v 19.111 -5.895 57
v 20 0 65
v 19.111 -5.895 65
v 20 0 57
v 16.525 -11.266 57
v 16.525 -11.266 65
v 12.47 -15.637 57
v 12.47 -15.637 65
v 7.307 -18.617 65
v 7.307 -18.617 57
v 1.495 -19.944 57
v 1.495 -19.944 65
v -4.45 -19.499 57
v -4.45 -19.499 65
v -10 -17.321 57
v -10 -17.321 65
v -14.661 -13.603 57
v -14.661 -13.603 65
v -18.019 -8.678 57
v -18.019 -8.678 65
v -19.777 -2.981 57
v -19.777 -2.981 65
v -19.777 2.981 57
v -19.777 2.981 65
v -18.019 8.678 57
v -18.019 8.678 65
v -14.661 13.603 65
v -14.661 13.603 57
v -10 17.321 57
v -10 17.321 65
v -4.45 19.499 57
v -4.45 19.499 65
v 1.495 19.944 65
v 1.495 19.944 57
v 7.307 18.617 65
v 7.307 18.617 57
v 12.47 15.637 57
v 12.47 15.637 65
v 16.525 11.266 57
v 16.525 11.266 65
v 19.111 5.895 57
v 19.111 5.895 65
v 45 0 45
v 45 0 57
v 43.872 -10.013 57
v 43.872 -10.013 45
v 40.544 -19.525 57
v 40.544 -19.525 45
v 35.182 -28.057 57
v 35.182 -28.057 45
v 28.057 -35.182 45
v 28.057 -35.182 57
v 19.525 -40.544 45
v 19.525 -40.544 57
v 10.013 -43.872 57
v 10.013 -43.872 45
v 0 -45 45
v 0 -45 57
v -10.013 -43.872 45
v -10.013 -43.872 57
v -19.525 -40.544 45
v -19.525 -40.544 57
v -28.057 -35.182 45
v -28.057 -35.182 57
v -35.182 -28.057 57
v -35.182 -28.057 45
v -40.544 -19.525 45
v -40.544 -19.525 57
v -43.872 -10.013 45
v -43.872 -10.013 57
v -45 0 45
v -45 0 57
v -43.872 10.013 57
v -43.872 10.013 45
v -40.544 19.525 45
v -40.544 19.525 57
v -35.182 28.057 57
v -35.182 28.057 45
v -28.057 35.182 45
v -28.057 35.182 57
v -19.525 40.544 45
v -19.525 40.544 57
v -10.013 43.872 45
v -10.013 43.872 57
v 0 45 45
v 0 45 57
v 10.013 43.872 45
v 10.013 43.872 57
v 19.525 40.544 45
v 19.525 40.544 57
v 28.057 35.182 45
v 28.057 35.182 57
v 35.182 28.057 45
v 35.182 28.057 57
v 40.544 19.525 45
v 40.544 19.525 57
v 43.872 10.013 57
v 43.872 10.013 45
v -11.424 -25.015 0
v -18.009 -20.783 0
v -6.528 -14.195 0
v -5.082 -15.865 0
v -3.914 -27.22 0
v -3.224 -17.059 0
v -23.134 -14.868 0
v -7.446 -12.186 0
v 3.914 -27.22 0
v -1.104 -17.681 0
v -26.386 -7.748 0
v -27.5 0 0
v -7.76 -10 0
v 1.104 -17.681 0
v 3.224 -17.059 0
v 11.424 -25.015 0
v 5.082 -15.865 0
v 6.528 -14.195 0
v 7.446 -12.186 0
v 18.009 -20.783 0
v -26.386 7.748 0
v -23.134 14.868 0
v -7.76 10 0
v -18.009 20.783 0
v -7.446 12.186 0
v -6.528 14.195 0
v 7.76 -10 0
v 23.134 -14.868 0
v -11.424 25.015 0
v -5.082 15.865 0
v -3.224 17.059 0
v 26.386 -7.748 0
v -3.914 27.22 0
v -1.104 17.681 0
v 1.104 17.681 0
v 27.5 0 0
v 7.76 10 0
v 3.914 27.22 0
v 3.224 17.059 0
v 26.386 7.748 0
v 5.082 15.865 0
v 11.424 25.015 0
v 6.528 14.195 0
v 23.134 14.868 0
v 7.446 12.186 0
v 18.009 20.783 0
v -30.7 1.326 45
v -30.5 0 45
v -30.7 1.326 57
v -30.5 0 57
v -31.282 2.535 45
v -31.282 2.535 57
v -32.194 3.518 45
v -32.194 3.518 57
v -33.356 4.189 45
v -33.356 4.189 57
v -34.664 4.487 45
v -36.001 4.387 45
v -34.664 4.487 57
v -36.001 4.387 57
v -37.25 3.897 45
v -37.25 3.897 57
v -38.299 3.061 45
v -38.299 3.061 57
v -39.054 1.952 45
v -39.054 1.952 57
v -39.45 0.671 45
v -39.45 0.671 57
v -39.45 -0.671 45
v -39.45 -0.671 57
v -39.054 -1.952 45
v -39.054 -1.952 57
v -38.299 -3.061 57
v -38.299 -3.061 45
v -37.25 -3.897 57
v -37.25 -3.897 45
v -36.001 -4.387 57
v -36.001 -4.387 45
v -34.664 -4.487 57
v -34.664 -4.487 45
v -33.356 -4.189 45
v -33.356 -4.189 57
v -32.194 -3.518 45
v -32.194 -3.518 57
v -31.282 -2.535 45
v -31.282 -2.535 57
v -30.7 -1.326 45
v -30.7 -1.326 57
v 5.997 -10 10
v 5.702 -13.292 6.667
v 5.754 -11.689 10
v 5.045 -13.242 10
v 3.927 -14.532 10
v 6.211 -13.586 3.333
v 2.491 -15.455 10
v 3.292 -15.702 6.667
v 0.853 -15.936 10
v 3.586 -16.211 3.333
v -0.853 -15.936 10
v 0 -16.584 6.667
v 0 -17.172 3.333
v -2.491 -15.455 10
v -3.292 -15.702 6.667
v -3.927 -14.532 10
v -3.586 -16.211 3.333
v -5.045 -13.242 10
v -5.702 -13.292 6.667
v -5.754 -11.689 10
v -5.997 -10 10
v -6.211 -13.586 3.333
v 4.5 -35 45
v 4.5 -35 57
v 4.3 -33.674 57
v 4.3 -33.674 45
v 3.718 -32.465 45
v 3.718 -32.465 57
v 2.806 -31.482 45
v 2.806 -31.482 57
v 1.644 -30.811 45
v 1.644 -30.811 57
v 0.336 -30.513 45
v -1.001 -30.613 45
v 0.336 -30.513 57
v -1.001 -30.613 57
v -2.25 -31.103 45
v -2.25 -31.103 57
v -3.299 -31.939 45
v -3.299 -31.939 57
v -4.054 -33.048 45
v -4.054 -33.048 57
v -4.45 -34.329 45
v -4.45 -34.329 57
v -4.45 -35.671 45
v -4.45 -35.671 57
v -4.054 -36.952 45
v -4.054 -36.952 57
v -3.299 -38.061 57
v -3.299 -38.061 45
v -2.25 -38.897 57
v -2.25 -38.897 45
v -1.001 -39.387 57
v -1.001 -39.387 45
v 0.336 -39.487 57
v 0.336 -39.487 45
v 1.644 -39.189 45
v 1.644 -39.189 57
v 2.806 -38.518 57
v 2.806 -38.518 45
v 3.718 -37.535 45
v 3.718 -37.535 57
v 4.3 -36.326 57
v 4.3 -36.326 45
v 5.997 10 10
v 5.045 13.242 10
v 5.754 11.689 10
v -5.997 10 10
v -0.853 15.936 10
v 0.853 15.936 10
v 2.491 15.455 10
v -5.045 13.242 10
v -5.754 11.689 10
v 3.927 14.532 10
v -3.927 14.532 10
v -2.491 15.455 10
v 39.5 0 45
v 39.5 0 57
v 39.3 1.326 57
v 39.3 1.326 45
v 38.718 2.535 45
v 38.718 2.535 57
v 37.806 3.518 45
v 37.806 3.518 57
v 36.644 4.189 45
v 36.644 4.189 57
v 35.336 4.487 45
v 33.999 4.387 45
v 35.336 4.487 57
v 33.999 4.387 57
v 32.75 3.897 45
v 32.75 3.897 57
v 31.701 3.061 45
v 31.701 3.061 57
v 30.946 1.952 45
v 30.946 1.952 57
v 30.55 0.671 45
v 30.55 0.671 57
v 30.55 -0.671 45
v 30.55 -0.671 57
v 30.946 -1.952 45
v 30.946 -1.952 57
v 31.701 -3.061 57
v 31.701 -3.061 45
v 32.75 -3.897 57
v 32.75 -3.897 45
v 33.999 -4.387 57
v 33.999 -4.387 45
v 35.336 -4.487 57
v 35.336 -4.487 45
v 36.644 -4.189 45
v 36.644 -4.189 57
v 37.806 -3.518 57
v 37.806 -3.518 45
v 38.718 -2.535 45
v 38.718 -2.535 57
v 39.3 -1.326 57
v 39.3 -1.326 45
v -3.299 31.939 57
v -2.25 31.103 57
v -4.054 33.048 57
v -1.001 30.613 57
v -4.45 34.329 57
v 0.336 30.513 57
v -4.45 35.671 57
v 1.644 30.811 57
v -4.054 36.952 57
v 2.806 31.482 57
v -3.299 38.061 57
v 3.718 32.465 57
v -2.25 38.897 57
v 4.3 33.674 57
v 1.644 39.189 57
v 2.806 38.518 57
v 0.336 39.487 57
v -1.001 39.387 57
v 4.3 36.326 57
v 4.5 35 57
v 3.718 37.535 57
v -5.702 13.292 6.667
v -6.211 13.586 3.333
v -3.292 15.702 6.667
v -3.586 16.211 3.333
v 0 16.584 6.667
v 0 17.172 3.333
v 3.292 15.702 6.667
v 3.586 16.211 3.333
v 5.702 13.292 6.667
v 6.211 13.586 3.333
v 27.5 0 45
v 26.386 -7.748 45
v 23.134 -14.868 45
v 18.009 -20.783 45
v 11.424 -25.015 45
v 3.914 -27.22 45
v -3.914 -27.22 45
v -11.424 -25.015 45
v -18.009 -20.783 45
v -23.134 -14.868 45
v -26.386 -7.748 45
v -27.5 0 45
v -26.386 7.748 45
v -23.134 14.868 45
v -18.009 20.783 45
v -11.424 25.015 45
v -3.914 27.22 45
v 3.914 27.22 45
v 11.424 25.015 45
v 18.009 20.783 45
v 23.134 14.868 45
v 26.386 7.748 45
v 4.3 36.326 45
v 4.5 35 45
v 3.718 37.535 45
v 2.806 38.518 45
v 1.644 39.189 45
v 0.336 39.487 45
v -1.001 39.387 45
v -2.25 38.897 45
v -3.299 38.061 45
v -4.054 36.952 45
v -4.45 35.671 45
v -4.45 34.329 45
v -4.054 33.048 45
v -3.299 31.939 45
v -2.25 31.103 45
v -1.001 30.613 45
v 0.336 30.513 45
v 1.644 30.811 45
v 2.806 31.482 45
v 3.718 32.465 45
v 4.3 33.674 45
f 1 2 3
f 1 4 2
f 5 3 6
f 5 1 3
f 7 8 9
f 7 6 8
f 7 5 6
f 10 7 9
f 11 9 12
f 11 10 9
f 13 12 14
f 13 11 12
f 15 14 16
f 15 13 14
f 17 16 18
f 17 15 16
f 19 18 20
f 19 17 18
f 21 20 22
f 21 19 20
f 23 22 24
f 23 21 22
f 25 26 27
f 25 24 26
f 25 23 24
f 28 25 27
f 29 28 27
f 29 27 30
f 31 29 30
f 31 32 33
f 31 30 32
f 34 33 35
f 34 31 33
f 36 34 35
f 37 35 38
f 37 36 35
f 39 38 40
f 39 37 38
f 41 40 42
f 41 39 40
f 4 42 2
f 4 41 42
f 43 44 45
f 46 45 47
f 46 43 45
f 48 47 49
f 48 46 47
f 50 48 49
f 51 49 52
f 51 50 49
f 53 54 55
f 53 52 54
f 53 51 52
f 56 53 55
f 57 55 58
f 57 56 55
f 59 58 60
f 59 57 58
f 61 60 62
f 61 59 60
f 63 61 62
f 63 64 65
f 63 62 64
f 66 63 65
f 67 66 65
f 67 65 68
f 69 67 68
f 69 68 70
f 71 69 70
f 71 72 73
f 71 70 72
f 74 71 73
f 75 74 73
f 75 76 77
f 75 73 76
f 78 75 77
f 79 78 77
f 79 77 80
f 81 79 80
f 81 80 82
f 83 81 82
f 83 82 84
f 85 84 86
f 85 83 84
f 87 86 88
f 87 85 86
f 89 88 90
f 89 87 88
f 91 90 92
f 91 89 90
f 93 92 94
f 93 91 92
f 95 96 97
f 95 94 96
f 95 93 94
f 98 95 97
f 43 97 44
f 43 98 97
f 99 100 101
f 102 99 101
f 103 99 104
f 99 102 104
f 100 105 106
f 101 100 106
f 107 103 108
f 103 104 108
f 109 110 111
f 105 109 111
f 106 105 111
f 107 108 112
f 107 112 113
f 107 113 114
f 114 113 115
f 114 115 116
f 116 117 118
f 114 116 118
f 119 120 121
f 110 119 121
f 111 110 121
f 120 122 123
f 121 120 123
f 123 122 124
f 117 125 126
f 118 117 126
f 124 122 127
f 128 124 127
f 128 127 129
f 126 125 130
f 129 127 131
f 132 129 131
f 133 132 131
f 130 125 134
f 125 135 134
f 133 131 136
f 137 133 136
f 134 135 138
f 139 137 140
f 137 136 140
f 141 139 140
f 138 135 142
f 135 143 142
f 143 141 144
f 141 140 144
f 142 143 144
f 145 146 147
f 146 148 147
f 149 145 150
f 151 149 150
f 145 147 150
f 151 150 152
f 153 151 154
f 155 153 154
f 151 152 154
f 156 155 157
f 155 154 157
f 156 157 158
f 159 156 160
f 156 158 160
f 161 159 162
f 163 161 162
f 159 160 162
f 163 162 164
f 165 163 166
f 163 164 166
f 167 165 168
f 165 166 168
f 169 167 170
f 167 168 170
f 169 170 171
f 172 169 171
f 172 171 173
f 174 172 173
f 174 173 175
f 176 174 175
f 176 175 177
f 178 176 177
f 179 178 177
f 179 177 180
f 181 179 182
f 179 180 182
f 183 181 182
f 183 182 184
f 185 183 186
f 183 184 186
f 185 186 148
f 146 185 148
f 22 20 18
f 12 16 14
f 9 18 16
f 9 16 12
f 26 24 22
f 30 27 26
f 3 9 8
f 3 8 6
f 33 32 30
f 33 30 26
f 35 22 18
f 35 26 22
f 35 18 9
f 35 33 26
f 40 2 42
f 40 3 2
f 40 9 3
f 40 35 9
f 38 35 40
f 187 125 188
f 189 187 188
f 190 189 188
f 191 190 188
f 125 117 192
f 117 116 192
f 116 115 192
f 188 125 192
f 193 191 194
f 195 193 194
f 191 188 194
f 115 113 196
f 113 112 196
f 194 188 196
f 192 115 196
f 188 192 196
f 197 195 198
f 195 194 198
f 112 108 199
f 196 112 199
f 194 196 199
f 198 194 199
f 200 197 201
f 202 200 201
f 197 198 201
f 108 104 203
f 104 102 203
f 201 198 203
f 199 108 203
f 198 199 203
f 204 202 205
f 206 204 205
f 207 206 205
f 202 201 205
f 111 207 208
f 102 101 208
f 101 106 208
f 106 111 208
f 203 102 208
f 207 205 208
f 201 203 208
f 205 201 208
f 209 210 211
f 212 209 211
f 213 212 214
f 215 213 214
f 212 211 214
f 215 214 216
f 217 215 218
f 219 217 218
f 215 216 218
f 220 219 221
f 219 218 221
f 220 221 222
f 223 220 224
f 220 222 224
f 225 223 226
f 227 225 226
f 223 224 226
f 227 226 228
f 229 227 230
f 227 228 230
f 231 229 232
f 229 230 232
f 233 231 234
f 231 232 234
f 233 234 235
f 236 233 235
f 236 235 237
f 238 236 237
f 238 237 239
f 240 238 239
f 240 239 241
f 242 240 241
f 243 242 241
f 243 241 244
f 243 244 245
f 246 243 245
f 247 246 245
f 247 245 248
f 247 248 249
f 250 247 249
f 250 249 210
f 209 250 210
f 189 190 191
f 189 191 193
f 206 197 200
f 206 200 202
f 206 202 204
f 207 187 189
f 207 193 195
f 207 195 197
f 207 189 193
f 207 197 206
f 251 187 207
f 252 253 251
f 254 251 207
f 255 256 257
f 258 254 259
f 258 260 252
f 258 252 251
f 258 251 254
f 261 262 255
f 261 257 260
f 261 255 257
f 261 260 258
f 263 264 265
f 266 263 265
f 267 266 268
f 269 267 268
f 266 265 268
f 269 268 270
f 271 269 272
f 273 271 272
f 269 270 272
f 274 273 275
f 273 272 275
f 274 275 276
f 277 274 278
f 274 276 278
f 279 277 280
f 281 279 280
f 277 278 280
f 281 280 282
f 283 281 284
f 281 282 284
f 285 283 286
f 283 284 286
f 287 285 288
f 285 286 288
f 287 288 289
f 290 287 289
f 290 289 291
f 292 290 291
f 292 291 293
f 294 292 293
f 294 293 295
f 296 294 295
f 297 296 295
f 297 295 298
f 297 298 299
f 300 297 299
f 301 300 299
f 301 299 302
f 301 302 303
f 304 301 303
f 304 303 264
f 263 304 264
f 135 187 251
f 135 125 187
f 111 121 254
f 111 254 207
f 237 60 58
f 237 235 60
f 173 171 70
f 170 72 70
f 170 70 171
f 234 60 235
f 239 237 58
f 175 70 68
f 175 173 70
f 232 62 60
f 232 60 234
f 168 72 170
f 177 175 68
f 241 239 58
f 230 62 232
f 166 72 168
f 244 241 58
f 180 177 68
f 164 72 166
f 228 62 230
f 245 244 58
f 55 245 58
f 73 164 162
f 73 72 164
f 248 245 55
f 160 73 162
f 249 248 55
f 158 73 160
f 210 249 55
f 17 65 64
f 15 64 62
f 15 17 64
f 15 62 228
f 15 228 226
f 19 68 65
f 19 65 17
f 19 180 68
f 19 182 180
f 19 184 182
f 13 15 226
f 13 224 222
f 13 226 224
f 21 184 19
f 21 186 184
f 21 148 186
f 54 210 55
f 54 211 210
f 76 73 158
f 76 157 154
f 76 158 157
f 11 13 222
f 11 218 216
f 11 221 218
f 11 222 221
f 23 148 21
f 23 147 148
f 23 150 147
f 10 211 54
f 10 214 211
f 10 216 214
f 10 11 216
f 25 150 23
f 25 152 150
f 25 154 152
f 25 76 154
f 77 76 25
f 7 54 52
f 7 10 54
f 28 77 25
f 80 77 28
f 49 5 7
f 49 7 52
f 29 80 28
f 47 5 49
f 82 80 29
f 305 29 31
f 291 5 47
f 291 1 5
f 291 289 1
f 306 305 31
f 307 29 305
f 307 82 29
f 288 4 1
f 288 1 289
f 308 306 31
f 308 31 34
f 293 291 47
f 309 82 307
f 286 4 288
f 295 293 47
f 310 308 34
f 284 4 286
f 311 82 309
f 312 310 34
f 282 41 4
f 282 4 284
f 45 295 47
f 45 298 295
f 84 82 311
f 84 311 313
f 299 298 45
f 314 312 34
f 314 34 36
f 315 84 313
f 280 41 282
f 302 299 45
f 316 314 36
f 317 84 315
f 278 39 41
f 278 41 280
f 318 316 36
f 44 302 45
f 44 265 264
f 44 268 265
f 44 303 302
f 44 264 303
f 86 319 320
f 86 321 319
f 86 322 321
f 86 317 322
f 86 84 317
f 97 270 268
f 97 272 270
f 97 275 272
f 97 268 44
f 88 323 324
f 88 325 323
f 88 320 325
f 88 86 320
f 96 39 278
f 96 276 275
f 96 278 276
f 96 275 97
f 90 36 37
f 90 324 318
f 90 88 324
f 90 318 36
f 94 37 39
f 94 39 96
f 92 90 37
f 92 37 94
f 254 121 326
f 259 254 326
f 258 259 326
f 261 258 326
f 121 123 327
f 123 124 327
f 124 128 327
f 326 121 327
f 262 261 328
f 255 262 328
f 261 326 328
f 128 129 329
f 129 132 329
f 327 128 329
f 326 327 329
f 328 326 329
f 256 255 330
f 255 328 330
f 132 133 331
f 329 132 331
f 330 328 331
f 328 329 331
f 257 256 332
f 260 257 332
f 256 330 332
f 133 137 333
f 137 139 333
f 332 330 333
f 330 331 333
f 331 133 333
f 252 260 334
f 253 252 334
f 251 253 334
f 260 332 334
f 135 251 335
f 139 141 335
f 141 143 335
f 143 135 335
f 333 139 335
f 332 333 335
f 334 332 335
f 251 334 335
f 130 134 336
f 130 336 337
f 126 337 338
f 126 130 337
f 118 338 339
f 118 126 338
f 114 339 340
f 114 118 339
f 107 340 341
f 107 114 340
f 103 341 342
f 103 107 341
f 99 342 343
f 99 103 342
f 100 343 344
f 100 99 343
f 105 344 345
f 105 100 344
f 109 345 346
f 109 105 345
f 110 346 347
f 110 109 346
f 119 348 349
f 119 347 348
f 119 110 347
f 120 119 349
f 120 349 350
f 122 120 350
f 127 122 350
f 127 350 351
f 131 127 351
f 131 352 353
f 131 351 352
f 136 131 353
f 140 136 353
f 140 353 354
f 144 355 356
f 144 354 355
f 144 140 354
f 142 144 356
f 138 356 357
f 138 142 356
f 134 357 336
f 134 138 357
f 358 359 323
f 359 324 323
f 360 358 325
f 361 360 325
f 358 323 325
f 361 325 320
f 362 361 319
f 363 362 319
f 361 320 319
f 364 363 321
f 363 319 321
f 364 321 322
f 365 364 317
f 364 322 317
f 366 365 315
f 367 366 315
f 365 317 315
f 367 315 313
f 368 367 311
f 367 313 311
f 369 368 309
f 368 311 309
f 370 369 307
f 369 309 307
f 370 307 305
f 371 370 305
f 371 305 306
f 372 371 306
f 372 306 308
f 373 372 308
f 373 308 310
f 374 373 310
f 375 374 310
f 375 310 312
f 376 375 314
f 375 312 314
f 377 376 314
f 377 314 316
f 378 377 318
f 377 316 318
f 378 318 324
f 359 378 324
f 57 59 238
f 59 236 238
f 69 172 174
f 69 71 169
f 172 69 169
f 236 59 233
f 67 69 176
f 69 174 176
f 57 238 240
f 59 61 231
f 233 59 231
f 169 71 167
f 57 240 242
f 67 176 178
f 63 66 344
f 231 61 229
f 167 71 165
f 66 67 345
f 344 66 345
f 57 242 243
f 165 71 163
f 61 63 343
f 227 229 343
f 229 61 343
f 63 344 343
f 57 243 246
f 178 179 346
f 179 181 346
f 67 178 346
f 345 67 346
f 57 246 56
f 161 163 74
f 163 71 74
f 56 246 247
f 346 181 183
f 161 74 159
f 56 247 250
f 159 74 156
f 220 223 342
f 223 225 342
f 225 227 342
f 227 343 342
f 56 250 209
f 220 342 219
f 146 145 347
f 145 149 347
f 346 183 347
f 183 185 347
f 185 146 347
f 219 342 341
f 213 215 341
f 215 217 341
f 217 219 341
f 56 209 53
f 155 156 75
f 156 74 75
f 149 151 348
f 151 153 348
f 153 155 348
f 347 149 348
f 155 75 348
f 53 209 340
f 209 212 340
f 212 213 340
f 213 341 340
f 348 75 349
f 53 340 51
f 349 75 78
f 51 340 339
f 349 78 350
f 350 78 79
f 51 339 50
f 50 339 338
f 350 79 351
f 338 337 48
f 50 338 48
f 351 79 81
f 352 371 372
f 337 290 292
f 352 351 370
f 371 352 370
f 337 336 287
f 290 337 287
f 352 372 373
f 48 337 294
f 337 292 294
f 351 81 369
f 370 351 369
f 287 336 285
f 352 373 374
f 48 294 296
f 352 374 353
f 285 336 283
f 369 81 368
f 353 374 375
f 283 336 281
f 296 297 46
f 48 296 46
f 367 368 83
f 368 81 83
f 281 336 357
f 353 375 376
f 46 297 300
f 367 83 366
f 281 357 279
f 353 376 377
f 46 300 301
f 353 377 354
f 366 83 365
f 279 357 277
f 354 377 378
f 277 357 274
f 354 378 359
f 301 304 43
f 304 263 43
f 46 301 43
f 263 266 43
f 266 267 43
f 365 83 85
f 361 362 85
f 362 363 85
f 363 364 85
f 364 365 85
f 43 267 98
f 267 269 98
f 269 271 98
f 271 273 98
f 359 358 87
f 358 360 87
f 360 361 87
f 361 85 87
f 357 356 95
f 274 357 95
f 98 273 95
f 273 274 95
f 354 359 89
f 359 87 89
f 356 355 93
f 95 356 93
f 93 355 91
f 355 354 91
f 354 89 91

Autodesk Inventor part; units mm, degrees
ref_plane "YZ Plane" through (0, 0, 0) normal (1, 0, 0) x (0, 1, 0)
ref_plane "XZ Plane" through (0, 0, 0) normal (0, 1, 0) x (-1, 0, 0)
ref_plane "XY Plane" through (0, 0, 0) normal (0, 0, 1) x (1, 0, 0)
sketch "Esboço1" plane through (0, 0, 0) normal (0, 0, 1) x (1, 0, 0)
  circle A0 centre (0, 0) radius 27.5
  dimension "d0" = 55
extrude "Extrusão1" add sketch "Esboço1" along normal blind 45
sketch "Esboço2" plane through (0, 0, 45) normal (0, 0, 1) x (1, 0, 0)
  circle A0 centre (0, 0) radius 45
  dimension "d3" = 90
extrude "Extrusão2" add sketch "Esboço2" along normal blind 12
sketch "Esboço3" plane through (0, 0, 57) normal (0, 0, 1) x (1, 0, 0)
  circle A0 centre (35, 0) radius 4.5
  circle A1 centre (0, 35) radius 4.5
  circle A2 centre (-35, 0) radius 4.5
  circle A3 centre (0, -35) radius 4.5
  point P0 (0, 0)
  dimension "d7" = 9
  dimension "d8" = 35
  dimension "d11" = 360
extrude "Extrusão3" cut sketch "Esboço3" against normal blind 17.5
sketch "Esboço4" plane through (0, 0, 57) normal (0, 0, 1) x (1, 0, 0)
  circle A0 centre (0, 0) radius 27.5 projected
  circle A1 centre (0, 0) radius 20
  dimension "d15" = 40
extrude "Extrusão4" add sketch "Esboço4" along normal blind 8 contours A1
sketch "Esboço6" plane through (0, 0, 0) normal (0, 0, -1) x (-1, 0, 0)
  line L0 (0, 10) -> (0, -10) construction
  line L1 (7.76, 10) -> (7.76, -10)
  line L2 (-7.76, -10) -> (-7.76, 10)
  arc A0 (7.76, 10) -> (-7.76, 10) centre (0, 10) ccw
  arc A1 (-7.76, -10) -> (7.76, -10) centre (0, -10) ccw
  point P0 (0, 0)
  point P1 (0, 0)
  dimension "d24" = 7.76
  dimension "d25" = 20
  dimension "d26" = 0
  dimension "d27" = 0
extrude "Extrusão5" cut sketch "Esboço6" against normal blind 10 draft -10
properties part number "Matriz inferior do Ferramental"
